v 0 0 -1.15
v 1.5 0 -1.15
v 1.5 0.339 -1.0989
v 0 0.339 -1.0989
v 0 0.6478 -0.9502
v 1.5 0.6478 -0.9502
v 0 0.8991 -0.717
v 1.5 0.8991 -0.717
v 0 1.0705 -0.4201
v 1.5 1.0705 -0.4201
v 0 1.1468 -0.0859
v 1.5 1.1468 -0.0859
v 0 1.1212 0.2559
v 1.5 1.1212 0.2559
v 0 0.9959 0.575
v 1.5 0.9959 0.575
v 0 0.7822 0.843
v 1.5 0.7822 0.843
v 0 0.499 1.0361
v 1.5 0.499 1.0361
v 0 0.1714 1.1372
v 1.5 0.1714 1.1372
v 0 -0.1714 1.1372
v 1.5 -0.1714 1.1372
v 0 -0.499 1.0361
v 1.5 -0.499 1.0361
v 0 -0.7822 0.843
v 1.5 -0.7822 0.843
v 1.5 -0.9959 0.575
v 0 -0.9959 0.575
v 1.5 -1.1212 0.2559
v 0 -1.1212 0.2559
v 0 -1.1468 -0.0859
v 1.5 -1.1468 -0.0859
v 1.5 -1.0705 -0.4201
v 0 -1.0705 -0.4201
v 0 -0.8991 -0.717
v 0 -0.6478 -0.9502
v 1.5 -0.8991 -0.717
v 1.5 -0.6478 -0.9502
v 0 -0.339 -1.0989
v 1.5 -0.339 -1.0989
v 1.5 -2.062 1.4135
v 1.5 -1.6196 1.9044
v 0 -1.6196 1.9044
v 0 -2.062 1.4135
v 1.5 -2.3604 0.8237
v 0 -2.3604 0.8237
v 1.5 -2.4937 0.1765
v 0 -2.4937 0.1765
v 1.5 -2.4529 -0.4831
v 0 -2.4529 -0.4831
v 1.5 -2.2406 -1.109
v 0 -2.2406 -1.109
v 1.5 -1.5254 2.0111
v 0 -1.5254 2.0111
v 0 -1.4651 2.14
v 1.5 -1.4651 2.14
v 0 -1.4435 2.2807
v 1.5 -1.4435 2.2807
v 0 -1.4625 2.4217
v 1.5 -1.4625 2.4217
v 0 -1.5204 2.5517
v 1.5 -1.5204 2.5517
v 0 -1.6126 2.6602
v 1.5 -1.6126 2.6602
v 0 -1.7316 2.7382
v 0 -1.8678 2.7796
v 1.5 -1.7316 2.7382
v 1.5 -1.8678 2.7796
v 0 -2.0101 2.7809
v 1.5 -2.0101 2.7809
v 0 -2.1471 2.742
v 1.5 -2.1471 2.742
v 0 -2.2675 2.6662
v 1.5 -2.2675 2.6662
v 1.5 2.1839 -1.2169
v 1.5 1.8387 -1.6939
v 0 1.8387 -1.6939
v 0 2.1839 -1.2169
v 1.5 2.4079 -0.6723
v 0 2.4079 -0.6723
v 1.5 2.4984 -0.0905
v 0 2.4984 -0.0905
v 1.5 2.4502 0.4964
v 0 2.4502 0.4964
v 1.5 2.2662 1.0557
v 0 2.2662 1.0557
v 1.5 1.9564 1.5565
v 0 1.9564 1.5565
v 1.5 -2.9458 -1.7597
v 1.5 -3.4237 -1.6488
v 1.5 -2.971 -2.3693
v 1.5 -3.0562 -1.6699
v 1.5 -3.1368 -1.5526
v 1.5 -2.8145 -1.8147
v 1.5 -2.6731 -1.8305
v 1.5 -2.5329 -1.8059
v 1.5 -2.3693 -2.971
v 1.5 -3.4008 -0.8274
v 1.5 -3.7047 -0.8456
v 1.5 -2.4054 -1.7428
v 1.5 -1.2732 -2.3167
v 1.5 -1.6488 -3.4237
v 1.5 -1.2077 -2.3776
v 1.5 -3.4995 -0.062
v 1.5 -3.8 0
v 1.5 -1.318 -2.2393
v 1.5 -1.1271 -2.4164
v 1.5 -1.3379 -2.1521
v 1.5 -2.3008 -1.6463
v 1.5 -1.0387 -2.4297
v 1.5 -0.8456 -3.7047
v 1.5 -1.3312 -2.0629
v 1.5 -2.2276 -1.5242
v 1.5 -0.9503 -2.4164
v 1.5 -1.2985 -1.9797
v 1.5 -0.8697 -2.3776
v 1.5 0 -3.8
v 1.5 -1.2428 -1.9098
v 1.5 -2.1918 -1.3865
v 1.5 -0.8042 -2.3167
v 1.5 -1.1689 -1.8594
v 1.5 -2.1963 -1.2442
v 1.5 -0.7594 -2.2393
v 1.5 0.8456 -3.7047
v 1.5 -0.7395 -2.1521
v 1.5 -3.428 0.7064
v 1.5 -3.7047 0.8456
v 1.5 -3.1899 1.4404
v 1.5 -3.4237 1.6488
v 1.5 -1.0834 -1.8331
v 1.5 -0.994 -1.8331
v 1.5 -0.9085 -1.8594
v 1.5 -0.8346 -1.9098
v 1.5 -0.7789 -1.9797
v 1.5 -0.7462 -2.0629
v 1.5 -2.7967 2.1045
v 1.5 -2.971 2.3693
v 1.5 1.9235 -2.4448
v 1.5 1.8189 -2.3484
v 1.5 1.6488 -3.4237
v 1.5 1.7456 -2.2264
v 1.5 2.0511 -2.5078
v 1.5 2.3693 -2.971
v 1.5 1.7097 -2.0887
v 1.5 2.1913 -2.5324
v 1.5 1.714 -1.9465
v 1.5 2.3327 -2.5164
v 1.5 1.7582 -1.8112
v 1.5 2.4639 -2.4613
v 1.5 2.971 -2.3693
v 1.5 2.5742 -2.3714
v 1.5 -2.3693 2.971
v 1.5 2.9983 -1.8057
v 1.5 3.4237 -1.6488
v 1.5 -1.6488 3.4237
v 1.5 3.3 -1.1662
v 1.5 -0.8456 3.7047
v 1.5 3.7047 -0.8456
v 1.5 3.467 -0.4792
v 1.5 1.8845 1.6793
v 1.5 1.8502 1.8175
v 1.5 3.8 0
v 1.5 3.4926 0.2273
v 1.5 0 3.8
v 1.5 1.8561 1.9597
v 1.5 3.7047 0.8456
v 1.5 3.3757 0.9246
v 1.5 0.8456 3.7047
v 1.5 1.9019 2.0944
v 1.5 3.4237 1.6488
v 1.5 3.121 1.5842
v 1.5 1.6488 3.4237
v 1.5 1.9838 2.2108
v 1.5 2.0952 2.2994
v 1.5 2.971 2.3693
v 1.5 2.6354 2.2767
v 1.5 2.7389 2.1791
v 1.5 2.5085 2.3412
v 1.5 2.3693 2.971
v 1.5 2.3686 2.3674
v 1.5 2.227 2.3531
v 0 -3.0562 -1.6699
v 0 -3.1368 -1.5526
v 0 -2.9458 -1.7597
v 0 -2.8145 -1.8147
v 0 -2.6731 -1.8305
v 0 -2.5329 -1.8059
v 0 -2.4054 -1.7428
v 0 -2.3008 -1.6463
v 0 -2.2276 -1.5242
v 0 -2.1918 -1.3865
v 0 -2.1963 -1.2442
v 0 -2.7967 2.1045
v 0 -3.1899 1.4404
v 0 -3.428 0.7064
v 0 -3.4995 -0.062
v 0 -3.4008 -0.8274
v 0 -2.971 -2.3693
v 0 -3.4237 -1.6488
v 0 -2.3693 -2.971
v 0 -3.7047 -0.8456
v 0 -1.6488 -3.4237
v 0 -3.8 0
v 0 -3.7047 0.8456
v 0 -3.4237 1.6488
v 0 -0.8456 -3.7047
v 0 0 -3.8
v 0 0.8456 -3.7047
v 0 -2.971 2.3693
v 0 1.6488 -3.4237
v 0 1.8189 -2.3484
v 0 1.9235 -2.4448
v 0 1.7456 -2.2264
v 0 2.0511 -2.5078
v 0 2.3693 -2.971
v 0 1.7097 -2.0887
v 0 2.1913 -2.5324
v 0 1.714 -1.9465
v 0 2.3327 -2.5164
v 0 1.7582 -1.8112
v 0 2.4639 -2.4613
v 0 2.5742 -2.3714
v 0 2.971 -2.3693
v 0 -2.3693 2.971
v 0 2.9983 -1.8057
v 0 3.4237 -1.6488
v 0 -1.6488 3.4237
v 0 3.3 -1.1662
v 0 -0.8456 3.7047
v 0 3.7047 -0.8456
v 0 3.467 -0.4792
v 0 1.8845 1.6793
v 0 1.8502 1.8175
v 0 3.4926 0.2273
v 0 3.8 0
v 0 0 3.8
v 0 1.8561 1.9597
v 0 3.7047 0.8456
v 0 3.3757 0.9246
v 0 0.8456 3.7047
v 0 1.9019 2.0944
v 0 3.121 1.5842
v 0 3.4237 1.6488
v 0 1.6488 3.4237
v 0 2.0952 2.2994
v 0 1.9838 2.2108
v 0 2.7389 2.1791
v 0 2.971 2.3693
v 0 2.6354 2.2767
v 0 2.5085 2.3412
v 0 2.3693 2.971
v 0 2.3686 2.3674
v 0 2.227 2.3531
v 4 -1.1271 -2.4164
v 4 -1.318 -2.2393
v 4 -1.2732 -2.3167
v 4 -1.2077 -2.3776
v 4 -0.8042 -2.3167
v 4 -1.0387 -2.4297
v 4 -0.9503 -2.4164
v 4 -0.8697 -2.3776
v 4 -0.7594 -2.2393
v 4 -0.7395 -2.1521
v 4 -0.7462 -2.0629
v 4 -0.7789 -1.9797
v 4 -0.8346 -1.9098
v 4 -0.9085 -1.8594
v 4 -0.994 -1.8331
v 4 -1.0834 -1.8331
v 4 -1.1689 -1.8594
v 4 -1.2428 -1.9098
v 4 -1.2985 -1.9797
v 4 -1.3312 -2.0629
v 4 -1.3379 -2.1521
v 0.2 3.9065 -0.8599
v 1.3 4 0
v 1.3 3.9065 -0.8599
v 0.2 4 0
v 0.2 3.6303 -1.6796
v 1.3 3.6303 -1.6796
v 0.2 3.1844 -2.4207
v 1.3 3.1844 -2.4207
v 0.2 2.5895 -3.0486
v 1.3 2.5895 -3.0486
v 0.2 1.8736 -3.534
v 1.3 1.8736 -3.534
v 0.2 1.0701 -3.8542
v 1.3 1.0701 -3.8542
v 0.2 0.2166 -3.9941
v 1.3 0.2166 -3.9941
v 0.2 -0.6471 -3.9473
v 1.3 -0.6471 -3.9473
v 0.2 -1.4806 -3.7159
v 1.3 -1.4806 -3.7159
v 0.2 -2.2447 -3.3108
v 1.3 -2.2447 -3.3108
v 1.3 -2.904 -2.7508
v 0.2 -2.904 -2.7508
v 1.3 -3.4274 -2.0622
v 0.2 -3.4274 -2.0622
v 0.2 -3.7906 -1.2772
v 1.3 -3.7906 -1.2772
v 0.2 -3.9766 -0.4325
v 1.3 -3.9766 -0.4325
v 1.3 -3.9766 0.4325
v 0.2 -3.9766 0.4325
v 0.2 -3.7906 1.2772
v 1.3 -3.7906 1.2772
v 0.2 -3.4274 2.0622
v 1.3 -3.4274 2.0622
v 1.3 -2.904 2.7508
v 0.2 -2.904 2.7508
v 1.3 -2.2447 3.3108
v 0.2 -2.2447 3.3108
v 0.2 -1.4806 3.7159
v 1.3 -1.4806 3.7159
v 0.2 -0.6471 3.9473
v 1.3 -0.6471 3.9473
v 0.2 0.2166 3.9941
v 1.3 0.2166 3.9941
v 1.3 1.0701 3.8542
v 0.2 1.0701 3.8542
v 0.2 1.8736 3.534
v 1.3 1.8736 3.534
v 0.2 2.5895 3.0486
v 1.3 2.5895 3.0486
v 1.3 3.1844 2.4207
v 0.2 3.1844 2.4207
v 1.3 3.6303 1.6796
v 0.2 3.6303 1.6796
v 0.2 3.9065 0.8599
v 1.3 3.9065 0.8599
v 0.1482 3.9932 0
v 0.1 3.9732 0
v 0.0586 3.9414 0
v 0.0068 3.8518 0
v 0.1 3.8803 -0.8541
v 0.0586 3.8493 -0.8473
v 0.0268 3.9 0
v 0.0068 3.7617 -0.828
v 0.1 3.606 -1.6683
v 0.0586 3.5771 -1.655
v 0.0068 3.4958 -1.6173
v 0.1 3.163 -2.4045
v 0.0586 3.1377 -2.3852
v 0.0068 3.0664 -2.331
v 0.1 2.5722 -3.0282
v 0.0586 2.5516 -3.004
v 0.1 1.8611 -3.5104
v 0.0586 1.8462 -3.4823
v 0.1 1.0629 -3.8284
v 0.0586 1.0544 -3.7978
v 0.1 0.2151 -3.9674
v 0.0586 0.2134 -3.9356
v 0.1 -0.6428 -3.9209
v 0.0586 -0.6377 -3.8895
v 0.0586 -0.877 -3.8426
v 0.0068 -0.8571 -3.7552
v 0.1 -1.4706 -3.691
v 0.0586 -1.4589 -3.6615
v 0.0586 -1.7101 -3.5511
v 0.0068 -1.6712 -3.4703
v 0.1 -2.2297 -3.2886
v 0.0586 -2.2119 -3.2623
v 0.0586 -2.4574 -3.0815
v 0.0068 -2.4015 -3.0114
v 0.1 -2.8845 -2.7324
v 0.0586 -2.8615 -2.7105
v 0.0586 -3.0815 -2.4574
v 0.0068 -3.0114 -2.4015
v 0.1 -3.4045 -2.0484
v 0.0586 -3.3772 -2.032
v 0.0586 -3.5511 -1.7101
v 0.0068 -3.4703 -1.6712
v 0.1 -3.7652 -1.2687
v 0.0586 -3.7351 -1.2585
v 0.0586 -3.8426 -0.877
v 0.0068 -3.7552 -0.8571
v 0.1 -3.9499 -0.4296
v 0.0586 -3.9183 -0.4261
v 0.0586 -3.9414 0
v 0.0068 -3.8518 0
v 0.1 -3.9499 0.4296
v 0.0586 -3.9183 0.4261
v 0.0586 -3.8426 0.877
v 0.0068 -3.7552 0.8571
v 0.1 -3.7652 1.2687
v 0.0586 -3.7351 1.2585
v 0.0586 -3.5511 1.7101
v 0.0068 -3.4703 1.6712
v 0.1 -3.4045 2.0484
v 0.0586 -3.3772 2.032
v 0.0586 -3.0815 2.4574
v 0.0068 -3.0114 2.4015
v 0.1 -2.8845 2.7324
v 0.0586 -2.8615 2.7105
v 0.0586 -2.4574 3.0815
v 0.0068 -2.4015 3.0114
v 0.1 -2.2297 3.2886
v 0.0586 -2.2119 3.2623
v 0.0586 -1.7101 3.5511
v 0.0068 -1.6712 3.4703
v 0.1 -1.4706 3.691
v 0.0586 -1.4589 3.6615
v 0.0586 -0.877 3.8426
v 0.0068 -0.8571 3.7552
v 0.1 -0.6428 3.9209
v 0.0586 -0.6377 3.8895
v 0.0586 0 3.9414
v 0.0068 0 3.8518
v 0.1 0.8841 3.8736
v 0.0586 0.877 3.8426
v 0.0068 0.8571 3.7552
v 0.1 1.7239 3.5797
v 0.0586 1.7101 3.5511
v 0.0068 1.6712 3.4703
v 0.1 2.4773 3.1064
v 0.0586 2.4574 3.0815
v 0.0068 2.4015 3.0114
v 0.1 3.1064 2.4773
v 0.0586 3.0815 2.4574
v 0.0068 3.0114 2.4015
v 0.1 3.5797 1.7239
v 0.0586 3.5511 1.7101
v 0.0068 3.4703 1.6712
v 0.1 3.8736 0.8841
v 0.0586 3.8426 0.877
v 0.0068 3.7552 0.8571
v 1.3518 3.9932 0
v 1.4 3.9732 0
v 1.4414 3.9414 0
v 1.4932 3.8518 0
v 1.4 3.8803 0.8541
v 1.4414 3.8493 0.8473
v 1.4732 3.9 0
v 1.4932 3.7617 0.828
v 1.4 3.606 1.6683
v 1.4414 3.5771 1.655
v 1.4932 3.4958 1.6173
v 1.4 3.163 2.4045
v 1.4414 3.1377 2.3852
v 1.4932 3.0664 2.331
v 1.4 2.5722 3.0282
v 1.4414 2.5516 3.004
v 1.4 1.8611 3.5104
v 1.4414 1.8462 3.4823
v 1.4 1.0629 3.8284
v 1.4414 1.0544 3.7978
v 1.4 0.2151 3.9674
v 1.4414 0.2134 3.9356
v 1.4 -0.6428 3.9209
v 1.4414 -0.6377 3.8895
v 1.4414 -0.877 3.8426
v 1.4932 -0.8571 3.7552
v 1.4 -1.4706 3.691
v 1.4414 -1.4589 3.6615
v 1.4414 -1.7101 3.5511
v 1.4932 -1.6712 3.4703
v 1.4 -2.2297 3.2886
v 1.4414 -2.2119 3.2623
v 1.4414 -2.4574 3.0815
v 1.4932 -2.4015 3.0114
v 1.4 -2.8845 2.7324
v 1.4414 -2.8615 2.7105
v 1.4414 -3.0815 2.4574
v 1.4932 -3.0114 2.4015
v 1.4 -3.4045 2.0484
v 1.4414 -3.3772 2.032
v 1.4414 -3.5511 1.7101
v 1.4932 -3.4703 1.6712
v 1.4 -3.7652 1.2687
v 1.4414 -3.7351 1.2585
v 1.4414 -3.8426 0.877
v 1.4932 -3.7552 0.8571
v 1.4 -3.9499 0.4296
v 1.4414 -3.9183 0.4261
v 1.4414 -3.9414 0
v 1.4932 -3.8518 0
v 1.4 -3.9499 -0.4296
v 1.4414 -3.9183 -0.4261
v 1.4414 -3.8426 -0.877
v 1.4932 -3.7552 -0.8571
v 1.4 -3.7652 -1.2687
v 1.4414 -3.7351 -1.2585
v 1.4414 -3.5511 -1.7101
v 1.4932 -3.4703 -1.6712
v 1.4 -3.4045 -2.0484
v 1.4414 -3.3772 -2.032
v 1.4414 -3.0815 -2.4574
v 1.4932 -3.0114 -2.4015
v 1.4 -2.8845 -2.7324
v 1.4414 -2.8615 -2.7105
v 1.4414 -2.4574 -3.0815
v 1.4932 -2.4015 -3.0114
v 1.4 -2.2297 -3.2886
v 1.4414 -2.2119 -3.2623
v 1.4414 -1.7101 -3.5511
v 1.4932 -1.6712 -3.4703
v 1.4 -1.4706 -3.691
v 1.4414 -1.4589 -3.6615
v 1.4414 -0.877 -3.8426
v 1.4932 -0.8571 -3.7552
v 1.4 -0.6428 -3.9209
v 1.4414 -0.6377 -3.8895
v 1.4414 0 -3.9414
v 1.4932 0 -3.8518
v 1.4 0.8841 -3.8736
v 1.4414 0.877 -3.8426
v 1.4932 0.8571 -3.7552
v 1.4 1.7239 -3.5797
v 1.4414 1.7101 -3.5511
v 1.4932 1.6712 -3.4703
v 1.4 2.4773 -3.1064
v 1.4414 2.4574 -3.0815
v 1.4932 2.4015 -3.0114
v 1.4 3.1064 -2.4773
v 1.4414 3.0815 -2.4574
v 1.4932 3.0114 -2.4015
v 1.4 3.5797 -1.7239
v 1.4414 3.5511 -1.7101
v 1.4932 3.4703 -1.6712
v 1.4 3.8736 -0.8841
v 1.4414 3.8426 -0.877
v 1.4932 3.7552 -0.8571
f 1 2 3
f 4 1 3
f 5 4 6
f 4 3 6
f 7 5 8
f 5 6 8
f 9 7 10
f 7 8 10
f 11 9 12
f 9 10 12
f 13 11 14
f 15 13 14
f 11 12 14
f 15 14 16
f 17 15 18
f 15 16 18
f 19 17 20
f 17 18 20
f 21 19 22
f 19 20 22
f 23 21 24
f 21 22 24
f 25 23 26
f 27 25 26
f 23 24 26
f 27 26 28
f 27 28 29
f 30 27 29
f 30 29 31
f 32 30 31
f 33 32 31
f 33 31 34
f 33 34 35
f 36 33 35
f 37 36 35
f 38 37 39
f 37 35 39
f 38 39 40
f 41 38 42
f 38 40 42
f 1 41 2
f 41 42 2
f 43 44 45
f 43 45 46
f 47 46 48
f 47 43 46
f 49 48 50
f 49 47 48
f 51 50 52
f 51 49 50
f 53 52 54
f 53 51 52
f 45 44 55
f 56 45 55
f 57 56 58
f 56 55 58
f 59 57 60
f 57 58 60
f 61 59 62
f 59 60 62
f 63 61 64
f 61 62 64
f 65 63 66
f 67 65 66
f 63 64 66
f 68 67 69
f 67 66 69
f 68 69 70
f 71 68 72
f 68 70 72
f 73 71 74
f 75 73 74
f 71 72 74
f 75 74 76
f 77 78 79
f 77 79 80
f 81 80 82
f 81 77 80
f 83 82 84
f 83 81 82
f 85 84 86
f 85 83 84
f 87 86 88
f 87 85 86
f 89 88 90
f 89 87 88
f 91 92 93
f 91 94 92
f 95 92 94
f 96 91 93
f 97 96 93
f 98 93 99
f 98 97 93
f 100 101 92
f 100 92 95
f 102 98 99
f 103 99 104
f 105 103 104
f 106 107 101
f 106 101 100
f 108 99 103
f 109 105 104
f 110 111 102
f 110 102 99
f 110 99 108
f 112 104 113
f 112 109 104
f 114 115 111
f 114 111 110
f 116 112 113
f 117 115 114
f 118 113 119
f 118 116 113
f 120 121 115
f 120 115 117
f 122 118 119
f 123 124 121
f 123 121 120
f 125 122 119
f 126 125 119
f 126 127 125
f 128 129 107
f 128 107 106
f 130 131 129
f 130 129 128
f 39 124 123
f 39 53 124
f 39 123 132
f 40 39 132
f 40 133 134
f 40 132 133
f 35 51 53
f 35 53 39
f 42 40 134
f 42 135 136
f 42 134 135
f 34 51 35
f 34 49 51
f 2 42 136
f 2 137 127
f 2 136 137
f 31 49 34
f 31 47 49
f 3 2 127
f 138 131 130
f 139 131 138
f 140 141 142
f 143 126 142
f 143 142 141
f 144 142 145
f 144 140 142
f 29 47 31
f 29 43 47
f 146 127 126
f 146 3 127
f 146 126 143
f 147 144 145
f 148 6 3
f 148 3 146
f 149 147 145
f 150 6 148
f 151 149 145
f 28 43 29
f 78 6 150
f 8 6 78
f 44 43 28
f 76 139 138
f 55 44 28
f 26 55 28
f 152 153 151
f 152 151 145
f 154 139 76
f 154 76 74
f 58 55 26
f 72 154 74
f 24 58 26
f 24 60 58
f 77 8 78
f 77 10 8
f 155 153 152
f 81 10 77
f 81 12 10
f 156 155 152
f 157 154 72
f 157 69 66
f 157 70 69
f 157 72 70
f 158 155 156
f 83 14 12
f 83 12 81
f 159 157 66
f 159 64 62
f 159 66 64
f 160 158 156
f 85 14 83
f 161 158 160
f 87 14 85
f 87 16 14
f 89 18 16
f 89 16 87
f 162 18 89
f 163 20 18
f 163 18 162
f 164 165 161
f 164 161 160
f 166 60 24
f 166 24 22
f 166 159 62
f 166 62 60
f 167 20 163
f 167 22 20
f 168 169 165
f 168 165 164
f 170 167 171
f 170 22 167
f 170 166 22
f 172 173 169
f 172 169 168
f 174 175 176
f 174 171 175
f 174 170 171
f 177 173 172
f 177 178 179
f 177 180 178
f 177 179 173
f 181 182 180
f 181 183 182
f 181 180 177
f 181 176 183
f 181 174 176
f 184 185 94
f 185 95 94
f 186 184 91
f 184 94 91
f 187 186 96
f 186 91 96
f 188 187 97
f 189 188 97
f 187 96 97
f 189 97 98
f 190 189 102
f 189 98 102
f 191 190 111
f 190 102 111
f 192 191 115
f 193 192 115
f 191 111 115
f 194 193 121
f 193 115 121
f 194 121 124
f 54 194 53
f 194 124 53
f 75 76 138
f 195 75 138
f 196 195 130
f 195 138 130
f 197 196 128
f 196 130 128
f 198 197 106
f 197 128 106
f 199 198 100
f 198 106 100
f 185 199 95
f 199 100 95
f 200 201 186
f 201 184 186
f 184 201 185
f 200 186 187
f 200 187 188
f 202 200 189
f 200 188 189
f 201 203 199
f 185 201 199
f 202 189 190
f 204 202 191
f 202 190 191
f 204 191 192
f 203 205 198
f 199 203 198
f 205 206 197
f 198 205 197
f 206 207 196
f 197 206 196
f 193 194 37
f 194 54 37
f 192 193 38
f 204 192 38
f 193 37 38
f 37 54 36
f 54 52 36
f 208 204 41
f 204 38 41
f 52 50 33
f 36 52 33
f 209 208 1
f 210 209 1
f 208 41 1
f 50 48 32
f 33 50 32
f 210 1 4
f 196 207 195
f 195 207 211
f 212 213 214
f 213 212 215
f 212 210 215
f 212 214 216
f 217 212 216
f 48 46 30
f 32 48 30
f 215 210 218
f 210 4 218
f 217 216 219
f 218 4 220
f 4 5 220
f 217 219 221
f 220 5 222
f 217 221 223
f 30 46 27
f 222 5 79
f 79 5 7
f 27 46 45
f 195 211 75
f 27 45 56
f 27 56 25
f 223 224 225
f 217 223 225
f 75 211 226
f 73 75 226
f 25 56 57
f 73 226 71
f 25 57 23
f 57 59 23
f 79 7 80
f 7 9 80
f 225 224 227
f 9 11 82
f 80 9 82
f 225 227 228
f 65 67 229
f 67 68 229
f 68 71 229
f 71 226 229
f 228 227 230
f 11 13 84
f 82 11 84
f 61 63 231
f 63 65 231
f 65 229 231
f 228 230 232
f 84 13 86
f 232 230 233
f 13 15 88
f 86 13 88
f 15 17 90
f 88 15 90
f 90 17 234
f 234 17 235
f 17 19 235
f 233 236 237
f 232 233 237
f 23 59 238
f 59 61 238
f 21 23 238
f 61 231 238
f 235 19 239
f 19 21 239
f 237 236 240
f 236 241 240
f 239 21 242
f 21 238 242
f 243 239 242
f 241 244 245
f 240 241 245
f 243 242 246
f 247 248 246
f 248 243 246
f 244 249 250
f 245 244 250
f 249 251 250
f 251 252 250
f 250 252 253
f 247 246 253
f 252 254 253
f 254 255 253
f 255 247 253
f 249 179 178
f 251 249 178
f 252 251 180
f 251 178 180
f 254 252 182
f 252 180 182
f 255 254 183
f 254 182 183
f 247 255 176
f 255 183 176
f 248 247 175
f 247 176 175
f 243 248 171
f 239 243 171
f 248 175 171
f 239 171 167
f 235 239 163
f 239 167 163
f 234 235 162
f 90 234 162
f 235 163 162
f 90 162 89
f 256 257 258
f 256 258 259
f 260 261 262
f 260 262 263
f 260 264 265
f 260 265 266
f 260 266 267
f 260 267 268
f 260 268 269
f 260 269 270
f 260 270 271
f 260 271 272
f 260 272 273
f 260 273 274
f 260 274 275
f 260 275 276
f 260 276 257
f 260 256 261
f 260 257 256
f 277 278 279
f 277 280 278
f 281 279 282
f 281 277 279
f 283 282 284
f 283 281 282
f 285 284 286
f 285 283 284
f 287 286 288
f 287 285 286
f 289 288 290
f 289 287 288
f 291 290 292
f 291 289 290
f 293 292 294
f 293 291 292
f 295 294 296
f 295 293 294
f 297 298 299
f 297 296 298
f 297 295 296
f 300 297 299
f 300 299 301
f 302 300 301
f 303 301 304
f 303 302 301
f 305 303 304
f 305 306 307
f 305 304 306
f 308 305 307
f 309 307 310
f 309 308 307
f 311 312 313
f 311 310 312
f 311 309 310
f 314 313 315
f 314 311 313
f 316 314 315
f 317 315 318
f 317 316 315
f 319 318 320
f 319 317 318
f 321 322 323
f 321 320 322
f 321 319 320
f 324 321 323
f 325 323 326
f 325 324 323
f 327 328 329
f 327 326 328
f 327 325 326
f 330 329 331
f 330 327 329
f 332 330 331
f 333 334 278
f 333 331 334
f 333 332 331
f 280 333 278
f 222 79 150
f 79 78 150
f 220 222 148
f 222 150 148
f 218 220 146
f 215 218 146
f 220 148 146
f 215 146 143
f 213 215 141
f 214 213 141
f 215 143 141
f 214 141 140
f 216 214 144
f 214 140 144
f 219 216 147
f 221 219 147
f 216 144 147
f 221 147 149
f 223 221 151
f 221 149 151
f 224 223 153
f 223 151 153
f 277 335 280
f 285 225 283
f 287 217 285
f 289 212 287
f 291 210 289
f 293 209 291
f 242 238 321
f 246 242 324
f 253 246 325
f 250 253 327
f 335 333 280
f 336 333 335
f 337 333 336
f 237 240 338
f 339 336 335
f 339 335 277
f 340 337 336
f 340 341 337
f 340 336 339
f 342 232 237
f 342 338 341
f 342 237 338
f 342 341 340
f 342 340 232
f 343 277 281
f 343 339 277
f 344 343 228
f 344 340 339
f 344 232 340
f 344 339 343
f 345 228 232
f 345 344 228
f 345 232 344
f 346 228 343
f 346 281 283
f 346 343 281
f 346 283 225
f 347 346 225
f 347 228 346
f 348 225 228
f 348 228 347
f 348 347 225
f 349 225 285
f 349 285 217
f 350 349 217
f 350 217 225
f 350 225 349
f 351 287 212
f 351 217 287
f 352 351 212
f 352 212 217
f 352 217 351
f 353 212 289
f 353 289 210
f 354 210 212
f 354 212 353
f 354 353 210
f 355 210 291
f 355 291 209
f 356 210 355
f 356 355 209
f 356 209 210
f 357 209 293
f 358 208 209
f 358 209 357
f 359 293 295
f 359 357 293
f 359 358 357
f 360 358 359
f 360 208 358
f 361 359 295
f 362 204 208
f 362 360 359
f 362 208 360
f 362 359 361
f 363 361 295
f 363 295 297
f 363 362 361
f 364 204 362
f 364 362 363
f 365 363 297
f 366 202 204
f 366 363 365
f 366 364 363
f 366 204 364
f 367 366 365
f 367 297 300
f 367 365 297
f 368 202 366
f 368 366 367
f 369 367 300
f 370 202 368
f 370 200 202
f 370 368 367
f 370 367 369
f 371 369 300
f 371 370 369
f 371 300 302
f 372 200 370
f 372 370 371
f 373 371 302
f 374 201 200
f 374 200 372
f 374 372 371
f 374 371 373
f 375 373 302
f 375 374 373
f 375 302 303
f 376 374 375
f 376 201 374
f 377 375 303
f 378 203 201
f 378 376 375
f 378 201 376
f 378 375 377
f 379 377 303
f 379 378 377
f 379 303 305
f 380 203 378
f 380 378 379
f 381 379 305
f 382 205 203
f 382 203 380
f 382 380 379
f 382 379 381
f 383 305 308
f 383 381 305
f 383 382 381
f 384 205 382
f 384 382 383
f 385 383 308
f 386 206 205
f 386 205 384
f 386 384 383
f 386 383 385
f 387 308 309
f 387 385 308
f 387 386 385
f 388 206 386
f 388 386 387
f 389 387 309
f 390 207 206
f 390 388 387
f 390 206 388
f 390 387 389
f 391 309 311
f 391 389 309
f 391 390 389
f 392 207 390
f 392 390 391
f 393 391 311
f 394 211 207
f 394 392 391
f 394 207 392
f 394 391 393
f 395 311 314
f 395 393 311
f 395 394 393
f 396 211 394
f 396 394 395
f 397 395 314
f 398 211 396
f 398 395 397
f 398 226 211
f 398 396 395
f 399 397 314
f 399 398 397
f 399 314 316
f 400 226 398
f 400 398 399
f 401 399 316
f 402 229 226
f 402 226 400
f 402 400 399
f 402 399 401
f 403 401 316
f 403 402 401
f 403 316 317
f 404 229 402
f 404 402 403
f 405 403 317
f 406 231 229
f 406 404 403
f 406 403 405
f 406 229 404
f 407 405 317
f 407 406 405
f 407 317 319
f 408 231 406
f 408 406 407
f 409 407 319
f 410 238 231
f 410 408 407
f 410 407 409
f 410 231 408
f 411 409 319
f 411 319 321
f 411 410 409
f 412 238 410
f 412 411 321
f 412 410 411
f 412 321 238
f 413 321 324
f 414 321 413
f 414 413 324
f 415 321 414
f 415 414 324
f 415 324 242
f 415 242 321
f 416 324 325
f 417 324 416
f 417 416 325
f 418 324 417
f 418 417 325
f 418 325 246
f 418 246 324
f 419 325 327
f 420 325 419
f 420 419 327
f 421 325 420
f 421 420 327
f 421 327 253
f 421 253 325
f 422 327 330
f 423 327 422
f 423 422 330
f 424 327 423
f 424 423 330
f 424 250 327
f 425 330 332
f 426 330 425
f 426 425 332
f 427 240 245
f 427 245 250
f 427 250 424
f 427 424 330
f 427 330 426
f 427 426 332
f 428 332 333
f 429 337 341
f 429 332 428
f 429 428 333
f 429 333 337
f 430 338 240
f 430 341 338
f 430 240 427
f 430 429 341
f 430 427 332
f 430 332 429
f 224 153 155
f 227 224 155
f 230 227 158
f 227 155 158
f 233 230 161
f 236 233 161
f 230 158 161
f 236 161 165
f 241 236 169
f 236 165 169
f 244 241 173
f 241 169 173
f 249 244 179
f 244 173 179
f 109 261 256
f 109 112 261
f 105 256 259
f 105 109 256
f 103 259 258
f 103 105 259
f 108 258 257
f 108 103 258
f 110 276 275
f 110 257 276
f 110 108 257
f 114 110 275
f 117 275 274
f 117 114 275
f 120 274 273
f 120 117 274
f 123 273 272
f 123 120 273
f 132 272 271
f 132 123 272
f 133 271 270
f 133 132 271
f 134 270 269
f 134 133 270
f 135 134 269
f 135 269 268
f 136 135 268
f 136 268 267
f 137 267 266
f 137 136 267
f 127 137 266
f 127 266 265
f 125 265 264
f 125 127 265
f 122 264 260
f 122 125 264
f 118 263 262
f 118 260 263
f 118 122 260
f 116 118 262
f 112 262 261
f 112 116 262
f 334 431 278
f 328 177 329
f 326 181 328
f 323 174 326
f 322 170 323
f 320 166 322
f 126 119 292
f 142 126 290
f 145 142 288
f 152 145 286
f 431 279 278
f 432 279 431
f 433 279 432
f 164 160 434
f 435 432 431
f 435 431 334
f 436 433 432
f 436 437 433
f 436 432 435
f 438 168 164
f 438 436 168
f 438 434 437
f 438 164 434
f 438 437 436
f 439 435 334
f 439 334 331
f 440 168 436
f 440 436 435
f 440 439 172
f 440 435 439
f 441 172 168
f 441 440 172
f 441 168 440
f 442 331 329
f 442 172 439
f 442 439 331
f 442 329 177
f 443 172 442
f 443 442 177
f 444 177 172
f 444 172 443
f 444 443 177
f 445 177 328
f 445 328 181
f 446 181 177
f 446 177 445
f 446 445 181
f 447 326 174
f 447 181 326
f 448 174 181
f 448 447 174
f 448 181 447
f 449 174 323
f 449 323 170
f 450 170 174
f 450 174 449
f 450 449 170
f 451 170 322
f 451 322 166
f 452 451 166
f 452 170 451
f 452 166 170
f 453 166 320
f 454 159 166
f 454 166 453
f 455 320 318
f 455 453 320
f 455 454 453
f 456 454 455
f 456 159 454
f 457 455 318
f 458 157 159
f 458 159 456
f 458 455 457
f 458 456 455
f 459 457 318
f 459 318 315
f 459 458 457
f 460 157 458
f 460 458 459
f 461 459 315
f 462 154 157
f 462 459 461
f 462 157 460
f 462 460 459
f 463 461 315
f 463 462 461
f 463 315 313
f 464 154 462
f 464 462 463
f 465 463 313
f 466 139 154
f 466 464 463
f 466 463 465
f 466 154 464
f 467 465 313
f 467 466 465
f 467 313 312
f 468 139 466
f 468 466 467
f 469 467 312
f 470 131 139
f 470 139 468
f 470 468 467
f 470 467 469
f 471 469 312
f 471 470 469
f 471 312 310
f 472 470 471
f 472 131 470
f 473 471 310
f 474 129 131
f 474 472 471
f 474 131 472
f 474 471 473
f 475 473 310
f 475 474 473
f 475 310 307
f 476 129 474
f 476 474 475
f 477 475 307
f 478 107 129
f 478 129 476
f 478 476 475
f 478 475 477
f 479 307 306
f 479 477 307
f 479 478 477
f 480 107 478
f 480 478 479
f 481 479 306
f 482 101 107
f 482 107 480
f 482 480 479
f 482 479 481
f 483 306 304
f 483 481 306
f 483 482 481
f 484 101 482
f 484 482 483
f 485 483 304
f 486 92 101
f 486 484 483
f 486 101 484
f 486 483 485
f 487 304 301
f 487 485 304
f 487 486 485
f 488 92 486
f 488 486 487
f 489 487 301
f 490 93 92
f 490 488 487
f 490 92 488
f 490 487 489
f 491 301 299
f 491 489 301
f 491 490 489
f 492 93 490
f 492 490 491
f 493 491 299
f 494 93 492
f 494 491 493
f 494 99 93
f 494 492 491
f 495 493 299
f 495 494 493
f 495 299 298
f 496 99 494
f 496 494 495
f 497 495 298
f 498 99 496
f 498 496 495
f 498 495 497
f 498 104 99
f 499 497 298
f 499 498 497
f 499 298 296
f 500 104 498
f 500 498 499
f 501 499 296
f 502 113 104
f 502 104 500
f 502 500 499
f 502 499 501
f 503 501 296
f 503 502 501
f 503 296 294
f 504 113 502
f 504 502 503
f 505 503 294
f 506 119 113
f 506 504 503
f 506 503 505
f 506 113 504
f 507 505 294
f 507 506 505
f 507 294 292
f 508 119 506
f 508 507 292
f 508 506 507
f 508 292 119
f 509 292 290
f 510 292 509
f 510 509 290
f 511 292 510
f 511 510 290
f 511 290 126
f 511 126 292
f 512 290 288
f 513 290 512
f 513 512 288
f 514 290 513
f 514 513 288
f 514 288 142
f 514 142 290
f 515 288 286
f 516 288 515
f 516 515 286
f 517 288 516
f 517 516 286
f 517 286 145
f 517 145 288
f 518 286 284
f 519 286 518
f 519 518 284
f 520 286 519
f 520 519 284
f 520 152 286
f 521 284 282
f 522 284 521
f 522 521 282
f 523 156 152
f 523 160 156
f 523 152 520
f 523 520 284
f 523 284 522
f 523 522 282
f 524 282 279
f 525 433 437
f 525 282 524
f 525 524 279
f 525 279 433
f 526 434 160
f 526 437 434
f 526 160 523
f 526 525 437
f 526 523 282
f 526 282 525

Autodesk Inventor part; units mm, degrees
ref_plane "YZ Plane" through (0, 0, 0) normal (1, 0, 0) x (0, 1, 0)
ref_plane "XZ Plane" through (0, 0, 0) normal (0, 1, 0) x (-1, 0, 0)
ref_plane "XY Plane" through (0, 0, 0) normal (0, 0, 1) x (1, 0, 0)
sketch "Sketch1" plane through (0, 0, 0) normal (1, 0, 0) x (0, 1, 0)
  circle A0 centre (0, 0) radius 4
  dimension "d0" = 8
extrude "Extrusion1" add sketch "Sketch1" along normal blind 1.5
sketch "Sketch2" plane through (1.5, 0, 0) normal (1, 0, 0) x (0, 0, -1)
  circle A0 centre (0, 0) radius 1.15
  arc A1 (-2.1791, 2.7389) -> (-1.5565, 1.9564) centre (-1.8678, 2.3476) ccw
  arc A2 (1.6939, 1.8387) -> (2.3714, 2.5742) centre (2.0326, 2.2065) ccw
  arc A3 (-1.9044, -1.6196) -> (-2.6662, -2.2675) centre (-2.2853, -1.9435) ccw
  arc A4 (1.5526, -3.1368) -> (1.109, -2.2406) centre (1.3308, -2.6887) ccw
  arc A5 (-1.9044, -1.6196) -> (1.109, -2.2406) centre (0, 0) ccw
  arc A6 (1.6939, 1.8387) -> (-1.5565, 1.9564) centre (0, 0) ccw
  arc A7 (-2.6662, -2.2675) -> (1.5526, -3.1368) centre (0, 0) ccw
  arc A8 (2.3714, 2.5742) -> (-2.1791, 2.7389) centre (0, 0) ccw
  dimension "d5" = 2.3
  dimension "d6" = 1
  dimension "d7" = 1
  dimension "d8" = 1
  dimension "d9" = 1
extrude "Extrusion2" cut sketch "Sketch2" against normal blind 2
fillet "Fillet1" radius 0.2 1 edges at (1.5, -4, 0)
fillet "Fillet2" radius 0.2 1 edges at (0, -4, 0)
sketch "Sketch6" plane through (1.5, 0, 0) normal (1, 0, 0) x (0, 0, -1)
  circle A0 centre (2.1297, -1.0387) radius 0.3
  point P0 (0, 0)
  dimension "d20" = 0.6
extrude "Extrusion5" add sketch "Sketch6" along normal blind 2.5
sketch "Sketch7" plane through (0, 0, 0) normal (-1, 0, 0) x (0, 0, 1)
  point P0 (0, 0)
properties part number "compression wheel"
